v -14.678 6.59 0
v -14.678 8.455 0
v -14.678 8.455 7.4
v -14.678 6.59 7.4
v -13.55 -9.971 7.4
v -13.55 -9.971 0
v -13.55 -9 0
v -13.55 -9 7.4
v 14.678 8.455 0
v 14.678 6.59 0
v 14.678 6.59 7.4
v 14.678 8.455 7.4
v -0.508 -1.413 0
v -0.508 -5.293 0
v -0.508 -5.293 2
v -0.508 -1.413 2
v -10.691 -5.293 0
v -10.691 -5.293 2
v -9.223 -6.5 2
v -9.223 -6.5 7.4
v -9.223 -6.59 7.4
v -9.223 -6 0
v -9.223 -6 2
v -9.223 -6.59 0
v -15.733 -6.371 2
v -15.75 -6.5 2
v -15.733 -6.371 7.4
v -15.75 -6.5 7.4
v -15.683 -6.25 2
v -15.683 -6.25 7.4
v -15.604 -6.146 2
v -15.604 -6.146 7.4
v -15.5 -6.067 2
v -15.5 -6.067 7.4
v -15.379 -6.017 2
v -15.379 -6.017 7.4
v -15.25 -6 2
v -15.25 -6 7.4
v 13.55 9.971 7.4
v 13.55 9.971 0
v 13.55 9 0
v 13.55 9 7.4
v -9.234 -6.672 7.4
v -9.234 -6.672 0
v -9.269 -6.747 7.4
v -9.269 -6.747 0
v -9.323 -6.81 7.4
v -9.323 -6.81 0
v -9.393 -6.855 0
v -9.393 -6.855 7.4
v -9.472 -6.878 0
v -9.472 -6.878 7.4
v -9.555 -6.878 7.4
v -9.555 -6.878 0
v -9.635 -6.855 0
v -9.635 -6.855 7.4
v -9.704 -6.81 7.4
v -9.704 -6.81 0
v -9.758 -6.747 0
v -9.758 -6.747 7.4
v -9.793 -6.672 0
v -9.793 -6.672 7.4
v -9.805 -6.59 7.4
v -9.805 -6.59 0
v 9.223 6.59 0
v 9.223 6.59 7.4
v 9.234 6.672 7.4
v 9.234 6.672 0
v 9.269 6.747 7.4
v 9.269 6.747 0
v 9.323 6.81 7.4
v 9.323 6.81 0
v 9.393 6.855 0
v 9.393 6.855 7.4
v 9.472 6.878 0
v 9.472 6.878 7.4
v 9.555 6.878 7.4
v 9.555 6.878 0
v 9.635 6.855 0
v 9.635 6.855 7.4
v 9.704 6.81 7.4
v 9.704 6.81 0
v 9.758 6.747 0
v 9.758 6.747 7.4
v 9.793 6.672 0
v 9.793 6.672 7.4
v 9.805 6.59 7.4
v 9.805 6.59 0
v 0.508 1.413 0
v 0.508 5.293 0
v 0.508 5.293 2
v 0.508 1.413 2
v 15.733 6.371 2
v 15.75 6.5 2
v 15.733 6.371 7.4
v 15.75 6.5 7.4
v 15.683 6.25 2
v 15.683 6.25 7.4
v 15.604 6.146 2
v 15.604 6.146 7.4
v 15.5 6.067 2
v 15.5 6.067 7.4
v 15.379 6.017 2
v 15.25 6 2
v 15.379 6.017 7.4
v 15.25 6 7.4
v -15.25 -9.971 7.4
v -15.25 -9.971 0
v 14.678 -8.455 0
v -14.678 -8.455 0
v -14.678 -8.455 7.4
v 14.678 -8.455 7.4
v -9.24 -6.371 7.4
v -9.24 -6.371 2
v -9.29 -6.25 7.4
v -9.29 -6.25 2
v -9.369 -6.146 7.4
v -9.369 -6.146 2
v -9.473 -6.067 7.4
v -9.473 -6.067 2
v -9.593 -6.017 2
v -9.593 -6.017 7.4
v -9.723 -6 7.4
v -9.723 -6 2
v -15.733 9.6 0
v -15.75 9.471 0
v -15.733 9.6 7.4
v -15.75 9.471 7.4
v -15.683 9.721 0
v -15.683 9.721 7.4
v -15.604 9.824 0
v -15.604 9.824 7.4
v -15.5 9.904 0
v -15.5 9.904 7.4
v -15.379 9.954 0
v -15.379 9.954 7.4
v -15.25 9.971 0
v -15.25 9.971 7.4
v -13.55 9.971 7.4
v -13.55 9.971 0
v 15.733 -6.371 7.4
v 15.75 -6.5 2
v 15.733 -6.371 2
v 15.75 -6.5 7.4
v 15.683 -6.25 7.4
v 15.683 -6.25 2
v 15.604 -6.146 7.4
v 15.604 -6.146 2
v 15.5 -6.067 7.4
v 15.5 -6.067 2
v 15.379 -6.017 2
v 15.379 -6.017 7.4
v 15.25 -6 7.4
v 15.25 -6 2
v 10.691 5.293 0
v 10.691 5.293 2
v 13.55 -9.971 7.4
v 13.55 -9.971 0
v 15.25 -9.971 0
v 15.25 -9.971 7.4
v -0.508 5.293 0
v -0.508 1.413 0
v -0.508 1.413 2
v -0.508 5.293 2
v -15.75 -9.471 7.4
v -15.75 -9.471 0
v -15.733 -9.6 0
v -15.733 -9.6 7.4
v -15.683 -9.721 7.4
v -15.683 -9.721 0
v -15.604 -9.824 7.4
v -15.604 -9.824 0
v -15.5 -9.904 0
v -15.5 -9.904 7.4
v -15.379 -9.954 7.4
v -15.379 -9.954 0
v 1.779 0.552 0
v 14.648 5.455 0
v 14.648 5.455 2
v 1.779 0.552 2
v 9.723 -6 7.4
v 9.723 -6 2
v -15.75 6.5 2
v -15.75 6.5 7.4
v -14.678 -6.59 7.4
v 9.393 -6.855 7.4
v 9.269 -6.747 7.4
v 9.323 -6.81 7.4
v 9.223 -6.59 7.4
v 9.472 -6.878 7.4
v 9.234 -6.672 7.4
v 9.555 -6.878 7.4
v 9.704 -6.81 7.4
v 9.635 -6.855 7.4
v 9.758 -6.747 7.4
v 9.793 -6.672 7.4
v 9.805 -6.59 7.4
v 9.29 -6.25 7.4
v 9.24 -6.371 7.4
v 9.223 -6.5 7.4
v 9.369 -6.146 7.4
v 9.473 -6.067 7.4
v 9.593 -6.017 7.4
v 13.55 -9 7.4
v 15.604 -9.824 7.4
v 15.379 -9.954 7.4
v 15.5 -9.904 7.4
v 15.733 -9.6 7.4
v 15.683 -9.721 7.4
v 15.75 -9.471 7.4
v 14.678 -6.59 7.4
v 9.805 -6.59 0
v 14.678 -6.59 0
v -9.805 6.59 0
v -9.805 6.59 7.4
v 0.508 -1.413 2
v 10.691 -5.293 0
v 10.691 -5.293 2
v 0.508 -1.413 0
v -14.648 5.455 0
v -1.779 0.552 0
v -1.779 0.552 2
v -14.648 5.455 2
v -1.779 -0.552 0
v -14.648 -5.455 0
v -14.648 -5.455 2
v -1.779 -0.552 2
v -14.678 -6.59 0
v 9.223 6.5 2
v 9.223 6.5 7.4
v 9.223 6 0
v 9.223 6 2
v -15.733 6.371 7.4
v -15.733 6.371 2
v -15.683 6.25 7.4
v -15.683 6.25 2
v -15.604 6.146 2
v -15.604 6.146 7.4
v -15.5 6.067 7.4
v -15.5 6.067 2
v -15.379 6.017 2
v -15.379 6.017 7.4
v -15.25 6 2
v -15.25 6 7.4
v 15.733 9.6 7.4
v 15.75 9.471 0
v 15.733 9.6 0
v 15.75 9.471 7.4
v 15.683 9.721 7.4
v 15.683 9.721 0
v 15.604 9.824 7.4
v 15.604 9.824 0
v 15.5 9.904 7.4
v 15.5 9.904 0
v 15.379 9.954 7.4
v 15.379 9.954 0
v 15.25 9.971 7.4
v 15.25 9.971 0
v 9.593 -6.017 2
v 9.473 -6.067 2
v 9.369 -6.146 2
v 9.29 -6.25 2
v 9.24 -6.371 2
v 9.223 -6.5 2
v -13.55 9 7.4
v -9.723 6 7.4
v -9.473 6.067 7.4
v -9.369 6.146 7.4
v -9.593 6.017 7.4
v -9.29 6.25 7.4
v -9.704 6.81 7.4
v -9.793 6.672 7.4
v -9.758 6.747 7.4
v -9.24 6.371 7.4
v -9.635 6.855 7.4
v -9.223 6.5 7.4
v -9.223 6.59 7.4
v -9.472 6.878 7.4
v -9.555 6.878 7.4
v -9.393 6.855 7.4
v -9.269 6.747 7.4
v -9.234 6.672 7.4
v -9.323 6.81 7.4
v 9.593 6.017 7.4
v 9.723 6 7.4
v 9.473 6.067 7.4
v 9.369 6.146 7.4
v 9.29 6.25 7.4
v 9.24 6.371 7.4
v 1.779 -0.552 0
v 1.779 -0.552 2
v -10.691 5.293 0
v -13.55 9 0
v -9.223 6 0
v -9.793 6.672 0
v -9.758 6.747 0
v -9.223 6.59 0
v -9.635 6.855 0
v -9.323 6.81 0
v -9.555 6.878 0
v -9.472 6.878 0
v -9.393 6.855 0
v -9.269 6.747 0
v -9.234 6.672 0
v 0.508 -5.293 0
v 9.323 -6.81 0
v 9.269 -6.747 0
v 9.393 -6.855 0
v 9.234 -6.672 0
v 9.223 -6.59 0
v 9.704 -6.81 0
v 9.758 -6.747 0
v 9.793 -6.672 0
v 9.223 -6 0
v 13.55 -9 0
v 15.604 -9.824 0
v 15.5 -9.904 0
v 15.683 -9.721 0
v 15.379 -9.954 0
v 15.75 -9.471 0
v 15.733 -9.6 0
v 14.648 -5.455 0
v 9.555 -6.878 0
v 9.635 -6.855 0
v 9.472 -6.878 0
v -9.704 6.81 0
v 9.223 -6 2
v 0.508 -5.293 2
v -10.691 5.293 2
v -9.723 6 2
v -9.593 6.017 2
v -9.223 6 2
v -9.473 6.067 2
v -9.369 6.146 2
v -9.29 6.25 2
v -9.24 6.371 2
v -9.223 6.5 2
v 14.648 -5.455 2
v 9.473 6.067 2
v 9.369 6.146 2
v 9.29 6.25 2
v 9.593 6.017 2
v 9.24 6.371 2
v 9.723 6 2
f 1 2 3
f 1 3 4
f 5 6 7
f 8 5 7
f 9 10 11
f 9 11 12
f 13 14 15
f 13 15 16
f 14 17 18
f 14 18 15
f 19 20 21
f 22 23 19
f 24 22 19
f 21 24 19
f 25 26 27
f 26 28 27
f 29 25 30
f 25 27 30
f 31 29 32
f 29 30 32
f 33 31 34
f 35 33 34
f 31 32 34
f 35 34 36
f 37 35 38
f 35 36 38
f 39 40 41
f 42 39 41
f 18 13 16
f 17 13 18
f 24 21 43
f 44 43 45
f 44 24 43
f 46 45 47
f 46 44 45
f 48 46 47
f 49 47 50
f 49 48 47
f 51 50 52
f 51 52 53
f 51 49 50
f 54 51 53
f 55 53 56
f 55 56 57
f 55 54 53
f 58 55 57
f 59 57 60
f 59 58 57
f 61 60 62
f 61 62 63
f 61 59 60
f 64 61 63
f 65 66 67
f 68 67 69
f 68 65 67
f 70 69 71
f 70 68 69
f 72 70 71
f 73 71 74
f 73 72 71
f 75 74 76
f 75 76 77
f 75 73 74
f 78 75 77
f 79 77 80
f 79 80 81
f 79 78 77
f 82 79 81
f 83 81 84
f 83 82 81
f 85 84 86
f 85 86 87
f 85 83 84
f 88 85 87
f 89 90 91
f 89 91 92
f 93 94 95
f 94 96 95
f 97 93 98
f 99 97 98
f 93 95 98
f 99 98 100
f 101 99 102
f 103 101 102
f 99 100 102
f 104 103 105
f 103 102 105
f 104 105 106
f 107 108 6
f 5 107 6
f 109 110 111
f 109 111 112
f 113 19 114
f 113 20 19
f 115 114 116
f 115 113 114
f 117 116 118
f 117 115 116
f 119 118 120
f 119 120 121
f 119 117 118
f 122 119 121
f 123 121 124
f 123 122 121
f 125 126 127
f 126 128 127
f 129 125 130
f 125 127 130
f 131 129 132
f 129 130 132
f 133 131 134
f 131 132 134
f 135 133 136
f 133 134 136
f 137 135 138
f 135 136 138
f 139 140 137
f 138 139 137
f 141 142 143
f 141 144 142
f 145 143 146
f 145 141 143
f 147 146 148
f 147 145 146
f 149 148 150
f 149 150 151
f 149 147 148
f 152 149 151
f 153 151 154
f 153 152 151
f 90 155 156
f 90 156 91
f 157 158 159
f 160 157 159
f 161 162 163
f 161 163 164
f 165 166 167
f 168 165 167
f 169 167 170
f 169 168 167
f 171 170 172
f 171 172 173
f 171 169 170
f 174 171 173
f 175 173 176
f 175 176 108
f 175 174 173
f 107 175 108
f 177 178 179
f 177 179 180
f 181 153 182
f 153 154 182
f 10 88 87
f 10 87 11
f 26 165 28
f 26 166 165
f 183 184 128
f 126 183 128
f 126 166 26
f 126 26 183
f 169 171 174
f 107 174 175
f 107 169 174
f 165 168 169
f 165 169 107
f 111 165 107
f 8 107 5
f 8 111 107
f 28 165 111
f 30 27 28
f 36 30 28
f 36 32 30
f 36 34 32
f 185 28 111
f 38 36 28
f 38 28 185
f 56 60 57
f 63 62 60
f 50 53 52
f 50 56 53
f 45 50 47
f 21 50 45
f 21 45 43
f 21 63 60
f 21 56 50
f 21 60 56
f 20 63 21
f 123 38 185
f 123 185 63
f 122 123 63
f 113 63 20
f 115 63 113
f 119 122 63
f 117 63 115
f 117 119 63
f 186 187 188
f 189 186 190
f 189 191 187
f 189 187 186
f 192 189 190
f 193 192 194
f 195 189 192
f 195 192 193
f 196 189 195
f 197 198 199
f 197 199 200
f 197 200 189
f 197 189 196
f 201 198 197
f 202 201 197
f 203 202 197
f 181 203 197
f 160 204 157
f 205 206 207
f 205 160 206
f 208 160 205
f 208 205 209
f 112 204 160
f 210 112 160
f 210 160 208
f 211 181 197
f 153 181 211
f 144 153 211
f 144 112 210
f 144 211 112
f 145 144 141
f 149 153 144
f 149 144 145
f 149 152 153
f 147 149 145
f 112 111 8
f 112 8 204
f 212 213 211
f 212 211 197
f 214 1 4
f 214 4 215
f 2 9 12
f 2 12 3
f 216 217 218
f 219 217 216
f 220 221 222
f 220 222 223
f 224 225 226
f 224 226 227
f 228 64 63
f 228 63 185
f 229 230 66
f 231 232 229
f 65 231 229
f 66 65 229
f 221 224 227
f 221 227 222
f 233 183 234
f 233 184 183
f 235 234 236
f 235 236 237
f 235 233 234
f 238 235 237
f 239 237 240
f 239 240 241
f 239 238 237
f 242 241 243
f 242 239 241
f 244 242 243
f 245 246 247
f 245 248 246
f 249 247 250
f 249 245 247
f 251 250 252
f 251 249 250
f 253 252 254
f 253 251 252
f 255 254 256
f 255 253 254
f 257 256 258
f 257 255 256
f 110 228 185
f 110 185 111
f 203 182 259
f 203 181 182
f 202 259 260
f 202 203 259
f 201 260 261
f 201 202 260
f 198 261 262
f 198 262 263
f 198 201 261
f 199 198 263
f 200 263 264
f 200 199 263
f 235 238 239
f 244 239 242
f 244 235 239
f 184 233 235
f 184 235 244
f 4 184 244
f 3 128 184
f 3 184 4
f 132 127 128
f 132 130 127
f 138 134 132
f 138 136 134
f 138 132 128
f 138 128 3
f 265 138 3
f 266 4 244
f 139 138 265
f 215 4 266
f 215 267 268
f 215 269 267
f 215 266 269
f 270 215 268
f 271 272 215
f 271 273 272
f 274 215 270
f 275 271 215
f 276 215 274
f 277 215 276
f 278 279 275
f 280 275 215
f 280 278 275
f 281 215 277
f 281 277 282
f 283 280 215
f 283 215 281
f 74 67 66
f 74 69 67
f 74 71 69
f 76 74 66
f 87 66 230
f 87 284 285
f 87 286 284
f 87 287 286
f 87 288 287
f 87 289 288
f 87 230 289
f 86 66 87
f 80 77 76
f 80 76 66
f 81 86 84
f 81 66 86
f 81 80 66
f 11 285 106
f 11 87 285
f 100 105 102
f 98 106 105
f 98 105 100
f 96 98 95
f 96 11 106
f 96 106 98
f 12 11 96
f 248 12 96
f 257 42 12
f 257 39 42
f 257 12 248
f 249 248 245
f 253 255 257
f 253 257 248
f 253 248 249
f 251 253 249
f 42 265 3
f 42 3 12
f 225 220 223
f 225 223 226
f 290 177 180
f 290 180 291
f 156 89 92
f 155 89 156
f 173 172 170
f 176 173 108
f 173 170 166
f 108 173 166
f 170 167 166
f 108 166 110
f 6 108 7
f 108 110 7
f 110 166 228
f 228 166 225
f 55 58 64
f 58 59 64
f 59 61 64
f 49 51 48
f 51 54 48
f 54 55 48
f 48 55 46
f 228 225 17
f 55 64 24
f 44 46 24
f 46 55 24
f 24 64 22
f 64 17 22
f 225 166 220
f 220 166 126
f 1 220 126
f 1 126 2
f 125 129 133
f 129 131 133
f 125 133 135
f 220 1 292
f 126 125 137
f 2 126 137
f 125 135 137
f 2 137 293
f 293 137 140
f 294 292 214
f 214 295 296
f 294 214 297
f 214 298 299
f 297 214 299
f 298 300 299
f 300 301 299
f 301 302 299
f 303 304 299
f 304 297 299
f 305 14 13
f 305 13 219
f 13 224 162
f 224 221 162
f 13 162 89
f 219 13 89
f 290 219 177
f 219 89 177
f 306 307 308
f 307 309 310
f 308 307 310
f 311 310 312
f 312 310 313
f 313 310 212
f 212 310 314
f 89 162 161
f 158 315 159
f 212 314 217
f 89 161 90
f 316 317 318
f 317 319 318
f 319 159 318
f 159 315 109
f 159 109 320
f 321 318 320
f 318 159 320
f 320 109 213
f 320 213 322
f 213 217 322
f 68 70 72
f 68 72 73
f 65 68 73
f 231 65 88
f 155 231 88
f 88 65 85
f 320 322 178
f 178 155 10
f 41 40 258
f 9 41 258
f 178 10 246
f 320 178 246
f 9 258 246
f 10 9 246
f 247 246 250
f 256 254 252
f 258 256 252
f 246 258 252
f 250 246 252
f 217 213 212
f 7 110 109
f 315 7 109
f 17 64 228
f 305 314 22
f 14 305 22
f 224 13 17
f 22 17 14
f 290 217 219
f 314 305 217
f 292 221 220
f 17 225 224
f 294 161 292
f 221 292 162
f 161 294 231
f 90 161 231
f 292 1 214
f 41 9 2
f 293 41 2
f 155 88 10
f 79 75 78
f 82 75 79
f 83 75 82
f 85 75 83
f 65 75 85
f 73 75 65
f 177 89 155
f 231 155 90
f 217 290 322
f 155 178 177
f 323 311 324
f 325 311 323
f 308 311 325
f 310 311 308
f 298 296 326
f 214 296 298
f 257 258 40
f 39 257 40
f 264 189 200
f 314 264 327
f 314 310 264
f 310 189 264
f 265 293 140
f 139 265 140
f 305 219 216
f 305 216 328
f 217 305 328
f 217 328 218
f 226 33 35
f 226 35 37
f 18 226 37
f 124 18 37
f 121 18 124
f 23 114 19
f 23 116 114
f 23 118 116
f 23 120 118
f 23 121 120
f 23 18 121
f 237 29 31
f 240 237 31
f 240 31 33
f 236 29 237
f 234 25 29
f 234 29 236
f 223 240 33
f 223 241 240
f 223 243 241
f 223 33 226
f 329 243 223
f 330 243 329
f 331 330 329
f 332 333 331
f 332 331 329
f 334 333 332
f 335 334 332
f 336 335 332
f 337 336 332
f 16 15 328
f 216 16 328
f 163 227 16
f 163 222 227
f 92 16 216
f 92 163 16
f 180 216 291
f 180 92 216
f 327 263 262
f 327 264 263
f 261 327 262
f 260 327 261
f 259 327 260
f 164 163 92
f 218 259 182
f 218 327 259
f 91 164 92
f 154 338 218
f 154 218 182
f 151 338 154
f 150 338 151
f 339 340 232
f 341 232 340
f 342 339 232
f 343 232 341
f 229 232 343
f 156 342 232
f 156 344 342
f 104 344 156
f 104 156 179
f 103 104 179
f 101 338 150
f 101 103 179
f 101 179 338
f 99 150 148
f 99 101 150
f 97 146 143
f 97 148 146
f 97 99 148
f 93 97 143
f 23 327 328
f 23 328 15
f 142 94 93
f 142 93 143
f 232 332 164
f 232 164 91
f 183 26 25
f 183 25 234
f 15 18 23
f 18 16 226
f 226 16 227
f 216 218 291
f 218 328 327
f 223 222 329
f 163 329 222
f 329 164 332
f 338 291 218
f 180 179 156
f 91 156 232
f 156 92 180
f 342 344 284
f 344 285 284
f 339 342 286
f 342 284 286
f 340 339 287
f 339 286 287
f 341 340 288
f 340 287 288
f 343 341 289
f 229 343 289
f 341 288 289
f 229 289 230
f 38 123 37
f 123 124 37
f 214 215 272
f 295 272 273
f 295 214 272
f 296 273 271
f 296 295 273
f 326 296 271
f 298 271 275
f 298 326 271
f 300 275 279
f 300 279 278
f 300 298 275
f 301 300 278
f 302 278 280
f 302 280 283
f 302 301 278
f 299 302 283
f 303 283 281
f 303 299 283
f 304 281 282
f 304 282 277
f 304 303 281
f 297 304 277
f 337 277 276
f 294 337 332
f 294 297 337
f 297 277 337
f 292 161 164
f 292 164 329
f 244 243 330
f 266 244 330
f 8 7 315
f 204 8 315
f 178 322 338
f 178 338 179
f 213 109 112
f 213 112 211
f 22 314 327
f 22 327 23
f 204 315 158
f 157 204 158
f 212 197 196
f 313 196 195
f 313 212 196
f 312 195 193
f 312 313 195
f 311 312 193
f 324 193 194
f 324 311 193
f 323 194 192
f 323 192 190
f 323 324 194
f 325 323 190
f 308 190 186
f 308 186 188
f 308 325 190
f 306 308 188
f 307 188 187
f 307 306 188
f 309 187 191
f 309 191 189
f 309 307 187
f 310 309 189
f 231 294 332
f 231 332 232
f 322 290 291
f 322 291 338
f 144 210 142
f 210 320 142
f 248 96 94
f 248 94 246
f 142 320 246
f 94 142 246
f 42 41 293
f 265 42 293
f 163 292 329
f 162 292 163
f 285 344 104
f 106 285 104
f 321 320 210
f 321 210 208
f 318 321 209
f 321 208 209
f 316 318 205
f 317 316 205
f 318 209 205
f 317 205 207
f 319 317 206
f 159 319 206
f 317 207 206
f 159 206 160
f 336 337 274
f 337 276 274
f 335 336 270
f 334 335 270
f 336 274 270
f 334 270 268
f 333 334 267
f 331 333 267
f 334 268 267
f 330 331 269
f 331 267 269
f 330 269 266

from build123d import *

# Parameters (mm, degrees)
F1_DEPTH = 7.4
F0_W     = 31.5
F0_H     = 12
F2_DEPTH = 2
F4_DEPTH = 25
F5_R     = 0.5
F6_R     = 0.5


# Not quite as in the source:
# - a feature names something its author has since deleted; it is built from what else it names


with BuildPart() as f1:
    # F0 (on Top) → F1 (new body)
    with BuildSketch(Plane.XY):
        Polygon((15.75, -9), (15.75, -6), (-15.75, -6), (-15.75, -9), (-15.75, -9.970754717), (-13.55, -9.970754717), (-13.55, -9), (13.55, -9), (13.55, -9.970754717), (15.75, -9.970754717), align=None)
    extrude(amount=F1_DEPTH)



with BuildPart() as f1b:
    # F0 (on Top) → F1, piece 2 (new body)
    with BuildSketch(Plane.XY):
        Polygon((13.55, 9.970754717), (13.55, 9), (-13.55, 9), (-13.55, 9.970754717), (-15.75, 9.970754717), (-15.75, 9), (-15.75, 6), (15.75, 6), (15.75, 9), (15.75, 9.970754717), align=None)
    extrude(amount=F1_DEPTH)


with BuildPart() as f1_1:
    add(f1.part)

    add(f1b.part)  # F2 merges F1b
    # F0 (on Top) → F2 (join)
    with BuildSketch(Plane.XY):
        Rectangle(F0_W, F0_H)
    extrude(amount=F2_DEPTH)

    # F3 (on face) → F4 (cut)
    with BuildSketch(Plane.XY):
        Polygon((-0.5079215625, -1.4132374693), (-10.6910164902, -5.2925117274), (-0.5079215625, -5.2925117274), align=None)
        Polygon((10.6910164902, -5.2925117274), (0.5079215625, -1.4132374693), (0.5079215625, -5.2925117274), align=None)
        Polygon((1.7789258686, -0.5523047257), (14.6478014067, -5.4547335021), (14.6478014067, -0.5523047257), (14.6478014067, 0.5523047257), (14.6478014067, 5.4547335021), (1.7789258686, 0.5523047257), align=None)
        Polygon((0.5079215625, 1.4132374693), (10.6910164902, 5.2925117274), (0.5079215625, 5.2925117274), align=None)
        Polygon((-0.5079215625, 5.2925117274), (-10.6910164902, 5.2925117274), (-0.5079215625, 1.4132374693), align=None)
        with BuildLine():
            Line((-9.222632274, 6), (9.222632274, 6))
            Line((9.222632274, 6), (9.222632274, 6.5901111811))
            ThreePointArc((9.222632274, 6.5901111811), (9.513632274, 6.8811111811), (9.804632274, 6.5901111811))
            Line((9.804632274, 6.5901111811), (13.0790583789, 6.5901111811))
            Line((13.0790583789, 6.5901111811), (13.7675590813, 6.5901111811))
            Line((13.7675590813, 6.5901111811), (14.6781420335, 6.5901111811))
            Line((14.6781420335, 6.5901111811), (14.6781420335, 8.4549048916))
            Line((14.6781420335, 8.4549048916), (13.7675590813, 8.4549048916))
            Line((13.7675590813, 8.4549048916), (13.0790583789, 8.4549048916))
            Line((13.0790583789, 8.4549048916), (7.4084047228, 8.4549048916))
            Line((7.4084047228, 8.4549048916), (6.8271243945, 8.4549048916))
            Line((6.8271243945, 8.4549048916), (-6.8271243945, 8.4549048916))
            Line((-6.8271243945, 8.4549048916), (-7.4084047228, 8.4549048916))
            Line((-7.4084047228, 8.4549048916), (-13.0790583789, 8.4549048916))
            Line((-13.0790583789, 8.4549048916), (-13.7675590813, 8.4549048916))
            Line((-13.7675590813, 8.4549048916), (-14.6781420335, 8.4549048916))
            Line((-14.6781420335, 8.4549048916), (-14.6781420335, 6.5901111811))
            Line((-14.6781420335, 6.5901111811), (-13.7675590813, 6.5901111811))
            Line((-13.7675590813, 6.5901111811), (-13.0790583789, 6.5901111811))
            Line((-13.0790583789, 6.5901111811), (-9.804632274, 6.5901111811))
            ThreePointArc((-9.804632274, 6.5901111811), (-9.513632274, 6.8811111811), (-9.222632274, 6.5901111811))
            Line((-9.222632274, 6.5901111811), (-9.222632274, 6))
        make_face()
        Polygon((-14.6478014067, 5.4547335021), (-14.6478014067, 0.5523047257), (-14.6478014067, -0.5523047257), (-14.6478014067, -5.4547335021), (-1.7789258686, -0.5523047257), (-1.7789258686, 0.5523047257), align=None)
        with BuildLine():
            Line((9.222632274, -6.5901111811), (9.222632274, -6))
            Line((9.222632274, -6), (-9.222632274, -6))
            Line((-9.222632274, -6), (-9.222632274, -6.5901111811))
            ThreePointArc((-9.222632274, -6.5901111811), (-9.513632274, -6.8811111811), (-9.804632274, -6.5901111811))
            Line((-9.804632274, -6.5901111811), (-13.0790583789, -6.5901111811))
            Line((-13.0790583789, -6.5901111811), (-13.7675590813, -6.5901111811))
            Line((-13.7675590813, -6.5901111811), (-14.6781420335, -6.5901111811))
            Line((-14.6781420335, -6.5901111811), (-14.6781420335, -8.4549048916))
            Line((-14.6781420335, -8.4549048916), (-13.7675590813, -8.4549048916))
            Line((-13.7675590813, -8.4549048916), (-13.0790583789, -8.4549048916))
            Line((-13.0790583789, -8.4549048916), (-7.4084047228, -8.4549048916))
            Line((-7.4084047228, -8.4549048916), (-6.8271243945, -8.4549048916))
            Line((-6.8271243945, -8.4549048916), (6.8271243945, -8.4549048916))
            Line((6.8271243945, -8.4549048916), (7.4084047228, -8.4549048916))
            Line((7.4084047228, -8.4549048916), (13.0790583789, -8.4549048916))
            Line((13.0790583789, -8.4549048916), (13.7675590813, -8.4549048916))
            Line((13.7675590813, -8.4549048916), (14.6781420335, -8.4549048916))
            Line((14.6781420335, -8.4549048916), (14.6781420335, -6.5901111811))
            Line((14.6781420335, -6.5901111811), (13.7675590813, -6.5901111811))
            Line((13.7675590813, -6.5901111811), (13.0790583789, -6.5901111811))
            Line((13.0790583789, -6.5901111811), (9.804632274, -6.5901111811))
            ThreePointArc((9.804632274, -6.5901111811), (9.513632274, -6.8811111811), (9.222632274, -6.5901111811))
        make_face()
    extrude(amount=F4_DEPTH, mode=Mode.SUBTRACT)

    # F5
    f5_edges = [f1_1.edges().sort_by_distance(p)[0] for p in [
        (-15.75, 6, 4.7),
        (-15.75, -6, 4.7),
        (15.75, 6, 4.7),
        (15.75, -6, 4.7),
        (15.75, -9.970755, 3.7),
        (-15.75, -9.970755, 3.7),
        (-15.75, 9.970755, 3.7),
        (15.75, 9.970755, 3.7),
    ]]
    fillet(f5_edges, radius=F5_R)

    # F6
    f6_edges = [f1_1.edges().sort_by_distance(p)[0] for p in [
        (-9.222632, 6, 4.7),
        (9.222632, 6, 4.7),
        (9.222632, -6, 4.7),
        (-9.222632, -6, 4.7),
    ]]
    fillet(f6_edges, radius=F6_R)


solid = f1_1.part
